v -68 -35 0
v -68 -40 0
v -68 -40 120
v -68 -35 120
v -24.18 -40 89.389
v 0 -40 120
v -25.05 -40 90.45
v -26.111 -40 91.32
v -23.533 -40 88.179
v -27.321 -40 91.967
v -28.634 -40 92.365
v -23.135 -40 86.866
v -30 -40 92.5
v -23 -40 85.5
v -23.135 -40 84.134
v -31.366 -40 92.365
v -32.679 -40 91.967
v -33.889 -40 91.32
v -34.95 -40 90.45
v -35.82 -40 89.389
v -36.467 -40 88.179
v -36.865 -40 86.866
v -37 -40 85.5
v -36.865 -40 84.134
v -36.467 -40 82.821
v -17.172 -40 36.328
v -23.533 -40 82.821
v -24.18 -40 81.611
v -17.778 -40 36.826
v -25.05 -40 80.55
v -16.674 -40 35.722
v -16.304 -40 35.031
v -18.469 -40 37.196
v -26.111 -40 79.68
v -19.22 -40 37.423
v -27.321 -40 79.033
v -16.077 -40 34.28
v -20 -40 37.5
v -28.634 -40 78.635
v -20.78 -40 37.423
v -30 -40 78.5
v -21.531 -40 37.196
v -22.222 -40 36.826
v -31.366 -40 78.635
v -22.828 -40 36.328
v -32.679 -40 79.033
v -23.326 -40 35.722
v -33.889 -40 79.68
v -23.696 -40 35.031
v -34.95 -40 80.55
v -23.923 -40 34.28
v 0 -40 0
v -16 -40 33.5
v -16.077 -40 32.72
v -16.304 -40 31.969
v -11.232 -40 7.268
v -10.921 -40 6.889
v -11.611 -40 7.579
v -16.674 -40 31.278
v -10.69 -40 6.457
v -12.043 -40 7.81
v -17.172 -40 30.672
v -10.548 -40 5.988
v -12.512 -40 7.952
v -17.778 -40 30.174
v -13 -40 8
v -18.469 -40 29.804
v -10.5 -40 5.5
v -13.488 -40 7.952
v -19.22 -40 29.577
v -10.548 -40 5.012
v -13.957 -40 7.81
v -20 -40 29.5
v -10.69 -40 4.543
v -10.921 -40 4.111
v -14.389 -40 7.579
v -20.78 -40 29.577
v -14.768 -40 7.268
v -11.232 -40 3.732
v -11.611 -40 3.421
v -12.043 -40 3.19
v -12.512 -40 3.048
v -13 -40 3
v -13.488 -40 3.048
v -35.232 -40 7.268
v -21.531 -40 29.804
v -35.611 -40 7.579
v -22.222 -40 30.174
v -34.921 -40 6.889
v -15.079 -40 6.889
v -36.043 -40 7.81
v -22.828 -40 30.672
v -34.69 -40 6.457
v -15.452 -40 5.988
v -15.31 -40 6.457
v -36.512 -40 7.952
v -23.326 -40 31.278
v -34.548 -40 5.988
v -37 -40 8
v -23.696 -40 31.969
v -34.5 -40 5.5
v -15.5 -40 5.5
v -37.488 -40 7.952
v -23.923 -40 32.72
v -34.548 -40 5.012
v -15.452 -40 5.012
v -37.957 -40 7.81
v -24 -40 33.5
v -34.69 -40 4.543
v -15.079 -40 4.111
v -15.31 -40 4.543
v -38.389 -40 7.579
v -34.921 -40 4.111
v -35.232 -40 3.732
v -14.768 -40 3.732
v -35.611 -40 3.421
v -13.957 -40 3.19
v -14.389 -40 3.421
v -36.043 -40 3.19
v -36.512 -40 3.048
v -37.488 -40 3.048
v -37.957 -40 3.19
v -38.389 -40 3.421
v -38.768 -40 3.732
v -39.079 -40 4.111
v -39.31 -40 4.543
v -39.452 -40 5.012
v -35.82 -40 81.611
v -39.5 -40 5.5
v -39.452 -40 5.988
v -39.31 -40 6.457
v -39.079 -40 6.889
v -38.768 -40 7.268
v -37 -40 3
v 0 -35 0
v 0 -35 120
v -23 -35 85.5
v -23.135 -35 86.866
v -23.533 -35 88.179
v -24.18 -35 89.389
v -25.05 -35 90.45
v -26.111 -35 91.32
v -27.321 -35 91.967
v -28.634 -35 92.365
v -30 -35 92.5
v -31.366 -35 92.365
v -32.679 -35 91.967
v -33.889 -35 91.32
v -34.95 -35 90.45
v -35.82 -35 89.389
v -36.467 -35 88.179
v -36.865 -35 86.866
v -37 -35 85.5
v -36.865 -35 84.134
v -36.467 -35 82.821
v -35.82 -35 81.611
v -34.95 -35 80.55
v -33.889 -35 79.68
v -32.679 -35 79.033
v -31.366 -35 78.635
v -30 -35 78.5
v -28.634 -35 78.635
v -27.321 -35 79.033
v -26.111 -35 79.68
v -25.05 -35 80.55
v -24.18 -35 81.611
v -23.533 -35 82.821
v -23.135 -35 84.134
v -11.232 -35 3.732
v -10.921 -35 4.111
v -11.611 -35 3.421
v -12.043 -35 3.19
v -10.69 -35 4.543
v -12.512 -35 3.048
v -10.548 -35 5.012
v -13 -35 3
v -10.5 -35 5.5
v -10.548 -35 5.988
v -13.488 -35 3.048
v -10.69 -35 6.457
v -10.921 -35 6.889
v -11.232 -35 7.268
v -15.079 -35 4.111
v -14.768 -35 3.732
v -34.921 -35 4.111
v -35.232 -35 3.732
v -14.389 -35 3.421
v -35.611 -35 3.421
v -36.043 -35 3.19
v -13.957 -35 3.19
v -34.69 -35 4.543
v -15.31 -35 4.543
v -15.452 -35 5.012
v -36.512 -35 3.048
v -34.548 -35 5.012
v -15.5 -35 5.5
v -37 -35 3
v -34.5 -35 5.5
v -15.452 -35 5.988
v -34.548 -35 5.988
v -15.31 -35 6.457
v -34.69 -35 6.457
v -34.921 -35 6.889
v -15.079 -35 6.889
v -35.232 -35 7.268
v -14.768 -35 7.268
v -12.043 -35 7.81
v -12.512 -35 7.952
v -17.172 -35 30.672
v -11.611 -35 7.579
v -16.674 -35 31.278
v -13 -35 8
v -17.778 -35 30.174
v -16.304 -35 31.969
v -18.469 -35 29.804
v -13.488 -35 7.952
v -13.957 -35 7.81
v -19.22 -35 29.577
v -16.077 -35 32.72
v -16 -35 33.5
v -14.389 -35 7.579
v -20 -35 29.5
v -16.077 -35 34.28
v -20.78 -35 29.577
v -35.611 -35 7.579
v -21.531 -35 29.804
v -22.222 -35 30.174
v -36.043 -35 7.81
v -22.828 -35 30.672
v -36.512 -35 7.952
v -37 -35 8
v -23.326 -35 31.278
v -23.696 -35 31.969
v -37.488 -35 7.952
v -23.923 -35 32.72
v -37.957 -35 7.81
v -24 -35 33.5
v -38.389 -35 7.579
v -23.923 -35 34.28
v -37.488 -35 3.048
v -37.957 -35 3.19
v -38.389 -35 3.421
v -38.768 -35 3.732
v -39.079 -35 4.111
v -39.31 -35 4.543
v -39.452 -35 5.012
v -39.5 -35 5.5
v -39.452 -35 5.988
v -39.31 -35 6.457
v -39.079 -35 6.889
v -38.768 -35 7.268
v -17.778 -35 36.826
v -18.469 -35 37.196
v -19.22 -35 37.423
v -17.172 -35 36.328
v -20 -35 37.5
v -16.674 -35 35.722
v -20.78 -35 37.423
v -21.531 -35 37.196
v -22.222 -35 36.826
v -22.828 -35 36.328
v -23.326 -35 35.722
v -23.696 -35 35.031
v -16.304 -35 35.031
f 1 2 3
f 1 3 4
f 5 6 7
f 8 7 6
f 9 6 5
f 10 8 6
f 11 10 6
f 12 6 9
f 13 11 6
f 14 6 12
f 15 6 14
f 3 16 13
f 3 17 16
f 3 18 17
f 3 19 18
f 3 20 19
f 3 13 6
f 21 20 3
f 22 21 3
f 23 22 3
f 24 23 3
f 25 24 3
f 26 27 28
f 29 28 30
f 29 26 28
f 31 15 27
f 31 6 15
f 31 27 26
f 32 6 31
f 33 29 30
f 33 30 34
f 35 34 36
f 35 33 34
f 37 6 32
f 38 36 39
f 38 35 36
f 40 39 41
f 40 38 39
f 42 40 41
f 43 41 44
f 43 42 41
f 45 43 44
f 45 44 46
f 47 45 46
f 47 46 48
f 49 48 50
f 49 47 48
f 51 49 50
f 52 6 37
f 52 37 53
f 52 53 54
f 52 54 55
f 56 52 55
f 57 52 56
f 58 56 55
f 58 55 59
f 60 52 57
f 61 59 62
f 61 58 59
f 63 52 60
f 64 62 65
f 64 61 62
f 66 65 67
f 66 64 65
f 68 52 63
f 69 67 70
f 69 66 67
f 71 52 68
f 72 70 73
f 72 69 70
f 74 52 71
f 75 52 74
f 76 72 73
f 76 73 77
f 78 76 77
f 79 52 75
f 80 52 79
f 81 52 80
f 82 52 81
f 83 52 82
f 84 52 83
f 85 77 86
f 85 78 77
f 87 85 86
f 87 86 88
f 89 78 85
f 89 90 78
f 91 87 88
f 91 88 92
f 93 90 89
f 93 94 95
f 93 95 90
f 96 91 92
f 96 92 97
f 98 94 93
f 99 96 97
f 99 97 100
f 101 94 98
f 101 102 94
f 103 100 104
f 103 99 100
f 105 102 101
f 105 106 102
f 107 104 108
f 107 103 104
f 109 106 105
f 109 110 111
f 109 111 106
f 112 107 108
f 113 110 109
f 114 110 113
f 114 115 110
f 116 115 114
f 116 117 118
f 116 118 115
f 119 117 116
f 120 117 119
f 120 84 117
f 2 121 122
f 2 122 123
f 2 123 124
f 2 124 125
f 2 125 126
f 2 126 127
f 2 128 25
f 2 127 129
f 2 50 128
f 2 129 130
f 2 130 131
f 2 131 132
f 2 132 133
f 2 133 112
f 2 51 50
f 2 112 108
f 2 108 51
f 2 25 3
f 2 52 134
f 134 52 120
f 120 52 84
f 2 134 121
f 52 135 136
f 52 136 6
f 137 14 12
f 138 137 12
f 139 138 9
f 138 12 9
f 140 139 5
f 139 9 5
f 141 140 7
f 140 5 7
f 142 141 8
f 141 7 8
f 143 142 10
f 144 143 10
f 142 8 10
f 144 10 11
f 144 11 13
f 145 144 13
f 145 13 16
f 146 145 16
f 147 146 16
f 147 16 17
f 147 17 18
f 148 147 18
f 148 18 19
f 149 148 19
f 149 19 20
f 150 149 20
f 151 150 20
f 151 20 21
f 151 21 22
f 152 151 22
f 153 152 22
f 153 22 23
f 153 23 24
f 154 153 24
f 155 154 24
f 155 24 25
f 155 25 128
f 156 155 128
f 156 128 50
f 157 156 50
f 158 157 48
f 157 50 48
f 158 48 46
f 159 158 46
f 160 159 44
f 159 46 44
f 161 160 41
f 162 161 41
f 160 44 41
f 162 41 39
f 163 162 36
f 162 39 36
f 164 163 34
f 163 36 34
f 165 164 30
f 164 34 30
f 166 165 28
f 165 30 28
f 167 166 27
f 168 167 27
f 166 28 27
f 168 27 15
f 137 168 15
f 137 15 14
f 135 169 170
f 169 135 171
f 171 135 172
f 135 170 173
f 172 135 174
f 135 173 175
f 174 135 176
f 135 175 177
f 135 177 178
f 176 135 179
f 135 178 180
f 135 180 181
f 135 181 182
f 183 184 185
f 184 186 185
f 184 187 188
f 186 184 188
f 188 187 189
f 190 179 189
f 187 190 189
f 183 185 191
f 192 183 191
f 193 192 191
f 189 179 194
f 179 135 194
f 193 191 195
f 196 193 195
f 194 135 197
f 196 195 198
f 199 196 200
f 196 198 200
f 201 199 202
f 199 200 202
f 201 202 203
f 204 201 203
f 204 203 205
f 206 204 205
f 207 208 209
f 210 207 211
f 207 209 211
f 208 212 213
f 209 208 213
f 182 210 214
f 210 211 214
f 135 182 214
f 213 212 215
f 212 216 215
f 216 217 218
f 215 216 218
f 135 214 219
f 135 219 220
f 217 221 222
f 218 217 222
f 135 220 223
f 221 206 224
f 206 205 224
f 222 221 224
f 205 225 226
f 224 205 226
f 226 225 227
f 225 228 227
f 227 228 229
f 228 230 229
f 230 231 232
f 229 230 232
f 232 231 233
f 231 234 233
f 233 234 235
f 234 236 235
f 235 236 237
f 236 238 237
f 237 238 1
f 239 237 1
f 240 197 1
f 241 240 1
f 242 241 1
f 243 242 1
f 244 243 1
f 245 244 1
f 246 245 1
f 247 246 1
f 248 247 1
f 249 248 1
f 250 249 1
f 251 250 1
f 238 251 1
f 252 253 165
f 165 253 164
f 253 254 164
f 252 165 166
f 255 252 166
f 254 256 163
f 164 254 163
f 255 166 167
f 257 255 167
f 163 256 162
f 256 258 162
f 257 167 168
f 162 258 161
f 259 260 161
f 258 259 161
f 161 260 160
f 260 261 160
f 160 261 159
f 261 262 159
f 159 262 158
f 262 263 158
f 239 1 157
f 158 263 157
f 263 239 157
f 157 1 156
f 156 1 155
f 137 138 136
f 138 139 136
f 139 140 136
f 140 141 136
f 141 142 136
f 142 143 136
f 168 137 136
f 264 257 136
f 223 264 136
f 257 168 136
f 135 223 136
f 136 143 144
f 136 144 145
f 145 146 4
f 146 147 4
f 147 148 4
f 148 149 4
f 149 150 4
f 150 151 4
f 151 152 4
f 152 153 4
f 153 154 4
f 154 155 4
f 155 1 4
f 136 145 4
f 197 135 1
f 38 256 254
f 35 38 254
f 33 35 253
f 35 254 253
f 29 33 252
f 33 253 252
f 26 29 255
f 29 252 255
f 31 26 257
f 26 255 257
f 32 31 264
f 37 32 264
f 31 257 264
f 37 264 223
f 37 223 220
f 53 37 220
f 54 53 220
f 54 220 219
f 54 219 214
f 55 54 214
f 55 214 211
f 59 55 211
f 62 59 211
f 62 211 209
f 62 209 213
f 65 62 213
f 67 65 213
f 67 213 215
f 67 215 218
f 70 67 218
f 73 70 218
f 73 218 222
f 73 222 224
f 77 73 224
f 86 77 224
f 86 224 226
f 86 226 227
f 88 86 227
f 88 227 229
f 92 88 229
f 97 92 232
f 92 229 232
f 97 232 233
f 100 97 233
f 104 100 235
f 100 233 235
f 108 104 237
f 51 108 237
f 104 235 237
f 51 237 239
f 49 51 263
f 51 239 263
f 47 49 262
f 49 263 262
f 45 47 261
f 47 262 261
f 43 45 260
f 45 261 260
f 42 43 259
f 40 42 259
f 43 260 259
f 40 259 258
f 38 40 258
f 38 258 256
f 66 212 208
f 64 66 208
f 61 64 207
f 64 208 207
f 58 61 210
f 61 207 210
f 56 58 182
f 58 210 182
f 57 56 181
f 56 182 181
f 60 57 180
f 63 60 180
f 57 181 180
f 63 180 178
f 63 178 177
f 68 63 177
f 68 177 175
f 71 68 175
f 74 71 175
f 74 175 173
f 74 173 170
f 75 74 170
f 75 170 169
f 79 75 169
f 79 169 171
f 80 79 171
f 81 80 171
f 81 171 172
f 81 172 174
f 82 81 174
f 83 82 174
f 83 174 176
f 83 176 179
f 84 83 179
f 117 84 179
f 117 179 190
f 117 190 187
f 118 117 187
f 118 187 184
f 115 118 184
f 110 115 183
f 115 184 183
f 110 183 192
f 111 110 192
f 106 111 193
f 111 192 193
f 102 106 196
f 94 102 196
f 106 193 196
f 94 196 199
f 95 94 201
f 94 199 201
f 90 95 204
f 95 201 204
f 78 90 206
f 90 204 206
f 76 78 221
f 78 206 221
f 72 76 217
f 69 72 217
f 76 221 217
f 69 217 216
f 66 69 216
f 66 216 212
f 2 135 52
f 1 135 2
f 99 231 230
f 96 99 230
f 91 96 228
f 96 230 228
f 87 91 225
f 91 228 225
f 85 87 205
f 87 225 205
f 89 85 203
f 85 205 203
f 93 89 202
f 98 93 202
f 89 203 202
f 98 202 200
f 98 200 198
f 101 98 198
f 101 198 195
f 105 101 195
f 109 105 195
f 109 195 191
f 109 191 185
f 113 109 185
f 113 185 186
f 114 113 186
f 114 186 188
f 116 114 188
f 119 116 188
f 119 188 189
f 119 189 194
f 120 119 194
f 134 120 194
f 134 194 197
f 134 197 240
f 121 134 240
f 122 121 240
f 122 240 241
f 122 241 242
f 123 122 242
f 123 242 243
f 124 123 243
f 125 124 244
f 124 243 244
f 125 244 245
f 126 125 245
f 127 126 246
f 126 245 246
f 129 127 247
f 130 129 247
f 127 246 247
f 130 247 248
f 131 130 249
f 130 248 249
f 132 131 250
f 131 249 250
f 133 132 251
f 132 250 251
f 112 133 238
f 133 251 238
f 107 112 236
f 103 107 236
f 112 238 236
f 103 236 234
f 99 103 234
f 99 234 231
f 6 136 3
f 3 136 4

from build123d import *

# Parameters (mm, degrees)
BOSS_EXTRU_1_DEPTH      = 120
ESQUISSE2_W             = 45
ESQUISSE2_H             = 35
ENL_V_MAT_EXTRU_1_DEPTH = 10
ESQUISSE3_R             = 7
ENL_V_MAT_EXTRU_2_DEPTH = 10
ESQUISSE4_R             = 3
ENL_V_MAT_EXTRU_3_DEPTH = 142.311712183
TROU_TARAUD_M61_D       = 5
TROU_TARAUD_M61_DEPTH   = 15
TROU_TARAUD_M61_TIP     = 1.502151548
ESQUISSE7_W             = 30
ESQUISSE7_H             = 35
ENL_V_MAT_EXTRU_4_DEPTH = 10
ESQUISSE8_R             = 4
ENL_V_MAT_EXTRU_5_DEPTH = 20


with BuildPart() as part:
    # Esquisse1 → Boss.-Extru.1 (new body)
    with BuildSketch(Plane.XY):
        Polygon((0, 0), (0, -40), (-68, -40), (-68, -35), (-5, -35), (-5, 0), align=None)
    extrude(amount=BOSS_EXTRU_1_DEPTH)

    # Esquisse2 → Enlèv. mat.-Extru.1 (cut)
    with BuildSketch(Plane.ZY.offset(5)):
        with Locations((22.5, -17.5)):
            Rectangle(ESQUISSE2_W, ESQUISSE2_H)
        with Locations((97.5, -17.5)):
            Rectangle(ESQUISSE2_W, ESQUISSE2_H)
    extrude(amount=-ENL_V_MAT_EXTRU_1_DEPTH, mode=Mode.SUBTRACT)

    # Esquisse3 → Enlèv. mat.-Extru.2 (cut)
    with BuildSketch(Plane.XZ.offset(40)):
        with Locations((-30, 85.5)):
            Circle(ESQUISSE3_R)
    extrude(amount=-ENL_V_MAT_EXTRU_2_DEPTH, mode=Mode.SUBTRACT)

    # Esquisse4 → Enlèv. mat.-Extru.3 (cut, through all)
    with BuildSketch(Plane.ZY.offset(5)):
        with Locations((50, -5)):
            Circle(ESQUISSE4_R)
        with Locations((50, -25)):
            Circle(ESQUISSE4_R)
    extrude(amount=-ENL_V_MAT_EXTRU_3_DEPTH, mode=Mode.SUBTRACT)

    # Trou taraudé M61
    with Locations(Plane(origin=(-37, -40, 5.5), x_dir=(0, 0, -1), z_dir=(0, -1, 0))):
        with Locations((0, 0), (0, 24)):
            Hole(TROU_TARAUD_M61_D / 2, depth=TROU_TARAUD_M61_DEPTH)
            with Locations((0, 0, -(TROU_TARAUD_M61_DEPTH + TROU_TARAUD_M61_TIP / 2))):  # 118° drill point
                Cone(0, TROU_TARAUD_M61_D / 2, TROU_TARAUD_M61_TIP, mode=Mode.SUBTRACT)

    # Esquisse7 → Enlèv. mat.-Extru.4 (cut)
    with BuildSketch(Plane.ZY.offset(5)):
        with Locations((60, -17.5)):
            Rectangle(ESQUISSE7_W, ESQUISSE7_H)
    extrude(amount=-ENL_V_MAT_EXTRU_4_DEPTH, mode=Mode.SUBTRACT)

    # Esquisse8 → Enlèv. mat.-Extru.5 (cut)
    with BuildSketch(Plane(origin=(0, -35, 0), x_dir=(1, 0, 0), z_dir=(0, 1, 0))):
        with Locations(Location((-20, -33.5, 0), (0, 0, 270))):
            Circle(ESQUISSE8_R)
    extrude(amount=-ENL_V_MAT_EXTRU_5_DEPTH, mode=Mode.SUBTRACT)


solid = part.part
